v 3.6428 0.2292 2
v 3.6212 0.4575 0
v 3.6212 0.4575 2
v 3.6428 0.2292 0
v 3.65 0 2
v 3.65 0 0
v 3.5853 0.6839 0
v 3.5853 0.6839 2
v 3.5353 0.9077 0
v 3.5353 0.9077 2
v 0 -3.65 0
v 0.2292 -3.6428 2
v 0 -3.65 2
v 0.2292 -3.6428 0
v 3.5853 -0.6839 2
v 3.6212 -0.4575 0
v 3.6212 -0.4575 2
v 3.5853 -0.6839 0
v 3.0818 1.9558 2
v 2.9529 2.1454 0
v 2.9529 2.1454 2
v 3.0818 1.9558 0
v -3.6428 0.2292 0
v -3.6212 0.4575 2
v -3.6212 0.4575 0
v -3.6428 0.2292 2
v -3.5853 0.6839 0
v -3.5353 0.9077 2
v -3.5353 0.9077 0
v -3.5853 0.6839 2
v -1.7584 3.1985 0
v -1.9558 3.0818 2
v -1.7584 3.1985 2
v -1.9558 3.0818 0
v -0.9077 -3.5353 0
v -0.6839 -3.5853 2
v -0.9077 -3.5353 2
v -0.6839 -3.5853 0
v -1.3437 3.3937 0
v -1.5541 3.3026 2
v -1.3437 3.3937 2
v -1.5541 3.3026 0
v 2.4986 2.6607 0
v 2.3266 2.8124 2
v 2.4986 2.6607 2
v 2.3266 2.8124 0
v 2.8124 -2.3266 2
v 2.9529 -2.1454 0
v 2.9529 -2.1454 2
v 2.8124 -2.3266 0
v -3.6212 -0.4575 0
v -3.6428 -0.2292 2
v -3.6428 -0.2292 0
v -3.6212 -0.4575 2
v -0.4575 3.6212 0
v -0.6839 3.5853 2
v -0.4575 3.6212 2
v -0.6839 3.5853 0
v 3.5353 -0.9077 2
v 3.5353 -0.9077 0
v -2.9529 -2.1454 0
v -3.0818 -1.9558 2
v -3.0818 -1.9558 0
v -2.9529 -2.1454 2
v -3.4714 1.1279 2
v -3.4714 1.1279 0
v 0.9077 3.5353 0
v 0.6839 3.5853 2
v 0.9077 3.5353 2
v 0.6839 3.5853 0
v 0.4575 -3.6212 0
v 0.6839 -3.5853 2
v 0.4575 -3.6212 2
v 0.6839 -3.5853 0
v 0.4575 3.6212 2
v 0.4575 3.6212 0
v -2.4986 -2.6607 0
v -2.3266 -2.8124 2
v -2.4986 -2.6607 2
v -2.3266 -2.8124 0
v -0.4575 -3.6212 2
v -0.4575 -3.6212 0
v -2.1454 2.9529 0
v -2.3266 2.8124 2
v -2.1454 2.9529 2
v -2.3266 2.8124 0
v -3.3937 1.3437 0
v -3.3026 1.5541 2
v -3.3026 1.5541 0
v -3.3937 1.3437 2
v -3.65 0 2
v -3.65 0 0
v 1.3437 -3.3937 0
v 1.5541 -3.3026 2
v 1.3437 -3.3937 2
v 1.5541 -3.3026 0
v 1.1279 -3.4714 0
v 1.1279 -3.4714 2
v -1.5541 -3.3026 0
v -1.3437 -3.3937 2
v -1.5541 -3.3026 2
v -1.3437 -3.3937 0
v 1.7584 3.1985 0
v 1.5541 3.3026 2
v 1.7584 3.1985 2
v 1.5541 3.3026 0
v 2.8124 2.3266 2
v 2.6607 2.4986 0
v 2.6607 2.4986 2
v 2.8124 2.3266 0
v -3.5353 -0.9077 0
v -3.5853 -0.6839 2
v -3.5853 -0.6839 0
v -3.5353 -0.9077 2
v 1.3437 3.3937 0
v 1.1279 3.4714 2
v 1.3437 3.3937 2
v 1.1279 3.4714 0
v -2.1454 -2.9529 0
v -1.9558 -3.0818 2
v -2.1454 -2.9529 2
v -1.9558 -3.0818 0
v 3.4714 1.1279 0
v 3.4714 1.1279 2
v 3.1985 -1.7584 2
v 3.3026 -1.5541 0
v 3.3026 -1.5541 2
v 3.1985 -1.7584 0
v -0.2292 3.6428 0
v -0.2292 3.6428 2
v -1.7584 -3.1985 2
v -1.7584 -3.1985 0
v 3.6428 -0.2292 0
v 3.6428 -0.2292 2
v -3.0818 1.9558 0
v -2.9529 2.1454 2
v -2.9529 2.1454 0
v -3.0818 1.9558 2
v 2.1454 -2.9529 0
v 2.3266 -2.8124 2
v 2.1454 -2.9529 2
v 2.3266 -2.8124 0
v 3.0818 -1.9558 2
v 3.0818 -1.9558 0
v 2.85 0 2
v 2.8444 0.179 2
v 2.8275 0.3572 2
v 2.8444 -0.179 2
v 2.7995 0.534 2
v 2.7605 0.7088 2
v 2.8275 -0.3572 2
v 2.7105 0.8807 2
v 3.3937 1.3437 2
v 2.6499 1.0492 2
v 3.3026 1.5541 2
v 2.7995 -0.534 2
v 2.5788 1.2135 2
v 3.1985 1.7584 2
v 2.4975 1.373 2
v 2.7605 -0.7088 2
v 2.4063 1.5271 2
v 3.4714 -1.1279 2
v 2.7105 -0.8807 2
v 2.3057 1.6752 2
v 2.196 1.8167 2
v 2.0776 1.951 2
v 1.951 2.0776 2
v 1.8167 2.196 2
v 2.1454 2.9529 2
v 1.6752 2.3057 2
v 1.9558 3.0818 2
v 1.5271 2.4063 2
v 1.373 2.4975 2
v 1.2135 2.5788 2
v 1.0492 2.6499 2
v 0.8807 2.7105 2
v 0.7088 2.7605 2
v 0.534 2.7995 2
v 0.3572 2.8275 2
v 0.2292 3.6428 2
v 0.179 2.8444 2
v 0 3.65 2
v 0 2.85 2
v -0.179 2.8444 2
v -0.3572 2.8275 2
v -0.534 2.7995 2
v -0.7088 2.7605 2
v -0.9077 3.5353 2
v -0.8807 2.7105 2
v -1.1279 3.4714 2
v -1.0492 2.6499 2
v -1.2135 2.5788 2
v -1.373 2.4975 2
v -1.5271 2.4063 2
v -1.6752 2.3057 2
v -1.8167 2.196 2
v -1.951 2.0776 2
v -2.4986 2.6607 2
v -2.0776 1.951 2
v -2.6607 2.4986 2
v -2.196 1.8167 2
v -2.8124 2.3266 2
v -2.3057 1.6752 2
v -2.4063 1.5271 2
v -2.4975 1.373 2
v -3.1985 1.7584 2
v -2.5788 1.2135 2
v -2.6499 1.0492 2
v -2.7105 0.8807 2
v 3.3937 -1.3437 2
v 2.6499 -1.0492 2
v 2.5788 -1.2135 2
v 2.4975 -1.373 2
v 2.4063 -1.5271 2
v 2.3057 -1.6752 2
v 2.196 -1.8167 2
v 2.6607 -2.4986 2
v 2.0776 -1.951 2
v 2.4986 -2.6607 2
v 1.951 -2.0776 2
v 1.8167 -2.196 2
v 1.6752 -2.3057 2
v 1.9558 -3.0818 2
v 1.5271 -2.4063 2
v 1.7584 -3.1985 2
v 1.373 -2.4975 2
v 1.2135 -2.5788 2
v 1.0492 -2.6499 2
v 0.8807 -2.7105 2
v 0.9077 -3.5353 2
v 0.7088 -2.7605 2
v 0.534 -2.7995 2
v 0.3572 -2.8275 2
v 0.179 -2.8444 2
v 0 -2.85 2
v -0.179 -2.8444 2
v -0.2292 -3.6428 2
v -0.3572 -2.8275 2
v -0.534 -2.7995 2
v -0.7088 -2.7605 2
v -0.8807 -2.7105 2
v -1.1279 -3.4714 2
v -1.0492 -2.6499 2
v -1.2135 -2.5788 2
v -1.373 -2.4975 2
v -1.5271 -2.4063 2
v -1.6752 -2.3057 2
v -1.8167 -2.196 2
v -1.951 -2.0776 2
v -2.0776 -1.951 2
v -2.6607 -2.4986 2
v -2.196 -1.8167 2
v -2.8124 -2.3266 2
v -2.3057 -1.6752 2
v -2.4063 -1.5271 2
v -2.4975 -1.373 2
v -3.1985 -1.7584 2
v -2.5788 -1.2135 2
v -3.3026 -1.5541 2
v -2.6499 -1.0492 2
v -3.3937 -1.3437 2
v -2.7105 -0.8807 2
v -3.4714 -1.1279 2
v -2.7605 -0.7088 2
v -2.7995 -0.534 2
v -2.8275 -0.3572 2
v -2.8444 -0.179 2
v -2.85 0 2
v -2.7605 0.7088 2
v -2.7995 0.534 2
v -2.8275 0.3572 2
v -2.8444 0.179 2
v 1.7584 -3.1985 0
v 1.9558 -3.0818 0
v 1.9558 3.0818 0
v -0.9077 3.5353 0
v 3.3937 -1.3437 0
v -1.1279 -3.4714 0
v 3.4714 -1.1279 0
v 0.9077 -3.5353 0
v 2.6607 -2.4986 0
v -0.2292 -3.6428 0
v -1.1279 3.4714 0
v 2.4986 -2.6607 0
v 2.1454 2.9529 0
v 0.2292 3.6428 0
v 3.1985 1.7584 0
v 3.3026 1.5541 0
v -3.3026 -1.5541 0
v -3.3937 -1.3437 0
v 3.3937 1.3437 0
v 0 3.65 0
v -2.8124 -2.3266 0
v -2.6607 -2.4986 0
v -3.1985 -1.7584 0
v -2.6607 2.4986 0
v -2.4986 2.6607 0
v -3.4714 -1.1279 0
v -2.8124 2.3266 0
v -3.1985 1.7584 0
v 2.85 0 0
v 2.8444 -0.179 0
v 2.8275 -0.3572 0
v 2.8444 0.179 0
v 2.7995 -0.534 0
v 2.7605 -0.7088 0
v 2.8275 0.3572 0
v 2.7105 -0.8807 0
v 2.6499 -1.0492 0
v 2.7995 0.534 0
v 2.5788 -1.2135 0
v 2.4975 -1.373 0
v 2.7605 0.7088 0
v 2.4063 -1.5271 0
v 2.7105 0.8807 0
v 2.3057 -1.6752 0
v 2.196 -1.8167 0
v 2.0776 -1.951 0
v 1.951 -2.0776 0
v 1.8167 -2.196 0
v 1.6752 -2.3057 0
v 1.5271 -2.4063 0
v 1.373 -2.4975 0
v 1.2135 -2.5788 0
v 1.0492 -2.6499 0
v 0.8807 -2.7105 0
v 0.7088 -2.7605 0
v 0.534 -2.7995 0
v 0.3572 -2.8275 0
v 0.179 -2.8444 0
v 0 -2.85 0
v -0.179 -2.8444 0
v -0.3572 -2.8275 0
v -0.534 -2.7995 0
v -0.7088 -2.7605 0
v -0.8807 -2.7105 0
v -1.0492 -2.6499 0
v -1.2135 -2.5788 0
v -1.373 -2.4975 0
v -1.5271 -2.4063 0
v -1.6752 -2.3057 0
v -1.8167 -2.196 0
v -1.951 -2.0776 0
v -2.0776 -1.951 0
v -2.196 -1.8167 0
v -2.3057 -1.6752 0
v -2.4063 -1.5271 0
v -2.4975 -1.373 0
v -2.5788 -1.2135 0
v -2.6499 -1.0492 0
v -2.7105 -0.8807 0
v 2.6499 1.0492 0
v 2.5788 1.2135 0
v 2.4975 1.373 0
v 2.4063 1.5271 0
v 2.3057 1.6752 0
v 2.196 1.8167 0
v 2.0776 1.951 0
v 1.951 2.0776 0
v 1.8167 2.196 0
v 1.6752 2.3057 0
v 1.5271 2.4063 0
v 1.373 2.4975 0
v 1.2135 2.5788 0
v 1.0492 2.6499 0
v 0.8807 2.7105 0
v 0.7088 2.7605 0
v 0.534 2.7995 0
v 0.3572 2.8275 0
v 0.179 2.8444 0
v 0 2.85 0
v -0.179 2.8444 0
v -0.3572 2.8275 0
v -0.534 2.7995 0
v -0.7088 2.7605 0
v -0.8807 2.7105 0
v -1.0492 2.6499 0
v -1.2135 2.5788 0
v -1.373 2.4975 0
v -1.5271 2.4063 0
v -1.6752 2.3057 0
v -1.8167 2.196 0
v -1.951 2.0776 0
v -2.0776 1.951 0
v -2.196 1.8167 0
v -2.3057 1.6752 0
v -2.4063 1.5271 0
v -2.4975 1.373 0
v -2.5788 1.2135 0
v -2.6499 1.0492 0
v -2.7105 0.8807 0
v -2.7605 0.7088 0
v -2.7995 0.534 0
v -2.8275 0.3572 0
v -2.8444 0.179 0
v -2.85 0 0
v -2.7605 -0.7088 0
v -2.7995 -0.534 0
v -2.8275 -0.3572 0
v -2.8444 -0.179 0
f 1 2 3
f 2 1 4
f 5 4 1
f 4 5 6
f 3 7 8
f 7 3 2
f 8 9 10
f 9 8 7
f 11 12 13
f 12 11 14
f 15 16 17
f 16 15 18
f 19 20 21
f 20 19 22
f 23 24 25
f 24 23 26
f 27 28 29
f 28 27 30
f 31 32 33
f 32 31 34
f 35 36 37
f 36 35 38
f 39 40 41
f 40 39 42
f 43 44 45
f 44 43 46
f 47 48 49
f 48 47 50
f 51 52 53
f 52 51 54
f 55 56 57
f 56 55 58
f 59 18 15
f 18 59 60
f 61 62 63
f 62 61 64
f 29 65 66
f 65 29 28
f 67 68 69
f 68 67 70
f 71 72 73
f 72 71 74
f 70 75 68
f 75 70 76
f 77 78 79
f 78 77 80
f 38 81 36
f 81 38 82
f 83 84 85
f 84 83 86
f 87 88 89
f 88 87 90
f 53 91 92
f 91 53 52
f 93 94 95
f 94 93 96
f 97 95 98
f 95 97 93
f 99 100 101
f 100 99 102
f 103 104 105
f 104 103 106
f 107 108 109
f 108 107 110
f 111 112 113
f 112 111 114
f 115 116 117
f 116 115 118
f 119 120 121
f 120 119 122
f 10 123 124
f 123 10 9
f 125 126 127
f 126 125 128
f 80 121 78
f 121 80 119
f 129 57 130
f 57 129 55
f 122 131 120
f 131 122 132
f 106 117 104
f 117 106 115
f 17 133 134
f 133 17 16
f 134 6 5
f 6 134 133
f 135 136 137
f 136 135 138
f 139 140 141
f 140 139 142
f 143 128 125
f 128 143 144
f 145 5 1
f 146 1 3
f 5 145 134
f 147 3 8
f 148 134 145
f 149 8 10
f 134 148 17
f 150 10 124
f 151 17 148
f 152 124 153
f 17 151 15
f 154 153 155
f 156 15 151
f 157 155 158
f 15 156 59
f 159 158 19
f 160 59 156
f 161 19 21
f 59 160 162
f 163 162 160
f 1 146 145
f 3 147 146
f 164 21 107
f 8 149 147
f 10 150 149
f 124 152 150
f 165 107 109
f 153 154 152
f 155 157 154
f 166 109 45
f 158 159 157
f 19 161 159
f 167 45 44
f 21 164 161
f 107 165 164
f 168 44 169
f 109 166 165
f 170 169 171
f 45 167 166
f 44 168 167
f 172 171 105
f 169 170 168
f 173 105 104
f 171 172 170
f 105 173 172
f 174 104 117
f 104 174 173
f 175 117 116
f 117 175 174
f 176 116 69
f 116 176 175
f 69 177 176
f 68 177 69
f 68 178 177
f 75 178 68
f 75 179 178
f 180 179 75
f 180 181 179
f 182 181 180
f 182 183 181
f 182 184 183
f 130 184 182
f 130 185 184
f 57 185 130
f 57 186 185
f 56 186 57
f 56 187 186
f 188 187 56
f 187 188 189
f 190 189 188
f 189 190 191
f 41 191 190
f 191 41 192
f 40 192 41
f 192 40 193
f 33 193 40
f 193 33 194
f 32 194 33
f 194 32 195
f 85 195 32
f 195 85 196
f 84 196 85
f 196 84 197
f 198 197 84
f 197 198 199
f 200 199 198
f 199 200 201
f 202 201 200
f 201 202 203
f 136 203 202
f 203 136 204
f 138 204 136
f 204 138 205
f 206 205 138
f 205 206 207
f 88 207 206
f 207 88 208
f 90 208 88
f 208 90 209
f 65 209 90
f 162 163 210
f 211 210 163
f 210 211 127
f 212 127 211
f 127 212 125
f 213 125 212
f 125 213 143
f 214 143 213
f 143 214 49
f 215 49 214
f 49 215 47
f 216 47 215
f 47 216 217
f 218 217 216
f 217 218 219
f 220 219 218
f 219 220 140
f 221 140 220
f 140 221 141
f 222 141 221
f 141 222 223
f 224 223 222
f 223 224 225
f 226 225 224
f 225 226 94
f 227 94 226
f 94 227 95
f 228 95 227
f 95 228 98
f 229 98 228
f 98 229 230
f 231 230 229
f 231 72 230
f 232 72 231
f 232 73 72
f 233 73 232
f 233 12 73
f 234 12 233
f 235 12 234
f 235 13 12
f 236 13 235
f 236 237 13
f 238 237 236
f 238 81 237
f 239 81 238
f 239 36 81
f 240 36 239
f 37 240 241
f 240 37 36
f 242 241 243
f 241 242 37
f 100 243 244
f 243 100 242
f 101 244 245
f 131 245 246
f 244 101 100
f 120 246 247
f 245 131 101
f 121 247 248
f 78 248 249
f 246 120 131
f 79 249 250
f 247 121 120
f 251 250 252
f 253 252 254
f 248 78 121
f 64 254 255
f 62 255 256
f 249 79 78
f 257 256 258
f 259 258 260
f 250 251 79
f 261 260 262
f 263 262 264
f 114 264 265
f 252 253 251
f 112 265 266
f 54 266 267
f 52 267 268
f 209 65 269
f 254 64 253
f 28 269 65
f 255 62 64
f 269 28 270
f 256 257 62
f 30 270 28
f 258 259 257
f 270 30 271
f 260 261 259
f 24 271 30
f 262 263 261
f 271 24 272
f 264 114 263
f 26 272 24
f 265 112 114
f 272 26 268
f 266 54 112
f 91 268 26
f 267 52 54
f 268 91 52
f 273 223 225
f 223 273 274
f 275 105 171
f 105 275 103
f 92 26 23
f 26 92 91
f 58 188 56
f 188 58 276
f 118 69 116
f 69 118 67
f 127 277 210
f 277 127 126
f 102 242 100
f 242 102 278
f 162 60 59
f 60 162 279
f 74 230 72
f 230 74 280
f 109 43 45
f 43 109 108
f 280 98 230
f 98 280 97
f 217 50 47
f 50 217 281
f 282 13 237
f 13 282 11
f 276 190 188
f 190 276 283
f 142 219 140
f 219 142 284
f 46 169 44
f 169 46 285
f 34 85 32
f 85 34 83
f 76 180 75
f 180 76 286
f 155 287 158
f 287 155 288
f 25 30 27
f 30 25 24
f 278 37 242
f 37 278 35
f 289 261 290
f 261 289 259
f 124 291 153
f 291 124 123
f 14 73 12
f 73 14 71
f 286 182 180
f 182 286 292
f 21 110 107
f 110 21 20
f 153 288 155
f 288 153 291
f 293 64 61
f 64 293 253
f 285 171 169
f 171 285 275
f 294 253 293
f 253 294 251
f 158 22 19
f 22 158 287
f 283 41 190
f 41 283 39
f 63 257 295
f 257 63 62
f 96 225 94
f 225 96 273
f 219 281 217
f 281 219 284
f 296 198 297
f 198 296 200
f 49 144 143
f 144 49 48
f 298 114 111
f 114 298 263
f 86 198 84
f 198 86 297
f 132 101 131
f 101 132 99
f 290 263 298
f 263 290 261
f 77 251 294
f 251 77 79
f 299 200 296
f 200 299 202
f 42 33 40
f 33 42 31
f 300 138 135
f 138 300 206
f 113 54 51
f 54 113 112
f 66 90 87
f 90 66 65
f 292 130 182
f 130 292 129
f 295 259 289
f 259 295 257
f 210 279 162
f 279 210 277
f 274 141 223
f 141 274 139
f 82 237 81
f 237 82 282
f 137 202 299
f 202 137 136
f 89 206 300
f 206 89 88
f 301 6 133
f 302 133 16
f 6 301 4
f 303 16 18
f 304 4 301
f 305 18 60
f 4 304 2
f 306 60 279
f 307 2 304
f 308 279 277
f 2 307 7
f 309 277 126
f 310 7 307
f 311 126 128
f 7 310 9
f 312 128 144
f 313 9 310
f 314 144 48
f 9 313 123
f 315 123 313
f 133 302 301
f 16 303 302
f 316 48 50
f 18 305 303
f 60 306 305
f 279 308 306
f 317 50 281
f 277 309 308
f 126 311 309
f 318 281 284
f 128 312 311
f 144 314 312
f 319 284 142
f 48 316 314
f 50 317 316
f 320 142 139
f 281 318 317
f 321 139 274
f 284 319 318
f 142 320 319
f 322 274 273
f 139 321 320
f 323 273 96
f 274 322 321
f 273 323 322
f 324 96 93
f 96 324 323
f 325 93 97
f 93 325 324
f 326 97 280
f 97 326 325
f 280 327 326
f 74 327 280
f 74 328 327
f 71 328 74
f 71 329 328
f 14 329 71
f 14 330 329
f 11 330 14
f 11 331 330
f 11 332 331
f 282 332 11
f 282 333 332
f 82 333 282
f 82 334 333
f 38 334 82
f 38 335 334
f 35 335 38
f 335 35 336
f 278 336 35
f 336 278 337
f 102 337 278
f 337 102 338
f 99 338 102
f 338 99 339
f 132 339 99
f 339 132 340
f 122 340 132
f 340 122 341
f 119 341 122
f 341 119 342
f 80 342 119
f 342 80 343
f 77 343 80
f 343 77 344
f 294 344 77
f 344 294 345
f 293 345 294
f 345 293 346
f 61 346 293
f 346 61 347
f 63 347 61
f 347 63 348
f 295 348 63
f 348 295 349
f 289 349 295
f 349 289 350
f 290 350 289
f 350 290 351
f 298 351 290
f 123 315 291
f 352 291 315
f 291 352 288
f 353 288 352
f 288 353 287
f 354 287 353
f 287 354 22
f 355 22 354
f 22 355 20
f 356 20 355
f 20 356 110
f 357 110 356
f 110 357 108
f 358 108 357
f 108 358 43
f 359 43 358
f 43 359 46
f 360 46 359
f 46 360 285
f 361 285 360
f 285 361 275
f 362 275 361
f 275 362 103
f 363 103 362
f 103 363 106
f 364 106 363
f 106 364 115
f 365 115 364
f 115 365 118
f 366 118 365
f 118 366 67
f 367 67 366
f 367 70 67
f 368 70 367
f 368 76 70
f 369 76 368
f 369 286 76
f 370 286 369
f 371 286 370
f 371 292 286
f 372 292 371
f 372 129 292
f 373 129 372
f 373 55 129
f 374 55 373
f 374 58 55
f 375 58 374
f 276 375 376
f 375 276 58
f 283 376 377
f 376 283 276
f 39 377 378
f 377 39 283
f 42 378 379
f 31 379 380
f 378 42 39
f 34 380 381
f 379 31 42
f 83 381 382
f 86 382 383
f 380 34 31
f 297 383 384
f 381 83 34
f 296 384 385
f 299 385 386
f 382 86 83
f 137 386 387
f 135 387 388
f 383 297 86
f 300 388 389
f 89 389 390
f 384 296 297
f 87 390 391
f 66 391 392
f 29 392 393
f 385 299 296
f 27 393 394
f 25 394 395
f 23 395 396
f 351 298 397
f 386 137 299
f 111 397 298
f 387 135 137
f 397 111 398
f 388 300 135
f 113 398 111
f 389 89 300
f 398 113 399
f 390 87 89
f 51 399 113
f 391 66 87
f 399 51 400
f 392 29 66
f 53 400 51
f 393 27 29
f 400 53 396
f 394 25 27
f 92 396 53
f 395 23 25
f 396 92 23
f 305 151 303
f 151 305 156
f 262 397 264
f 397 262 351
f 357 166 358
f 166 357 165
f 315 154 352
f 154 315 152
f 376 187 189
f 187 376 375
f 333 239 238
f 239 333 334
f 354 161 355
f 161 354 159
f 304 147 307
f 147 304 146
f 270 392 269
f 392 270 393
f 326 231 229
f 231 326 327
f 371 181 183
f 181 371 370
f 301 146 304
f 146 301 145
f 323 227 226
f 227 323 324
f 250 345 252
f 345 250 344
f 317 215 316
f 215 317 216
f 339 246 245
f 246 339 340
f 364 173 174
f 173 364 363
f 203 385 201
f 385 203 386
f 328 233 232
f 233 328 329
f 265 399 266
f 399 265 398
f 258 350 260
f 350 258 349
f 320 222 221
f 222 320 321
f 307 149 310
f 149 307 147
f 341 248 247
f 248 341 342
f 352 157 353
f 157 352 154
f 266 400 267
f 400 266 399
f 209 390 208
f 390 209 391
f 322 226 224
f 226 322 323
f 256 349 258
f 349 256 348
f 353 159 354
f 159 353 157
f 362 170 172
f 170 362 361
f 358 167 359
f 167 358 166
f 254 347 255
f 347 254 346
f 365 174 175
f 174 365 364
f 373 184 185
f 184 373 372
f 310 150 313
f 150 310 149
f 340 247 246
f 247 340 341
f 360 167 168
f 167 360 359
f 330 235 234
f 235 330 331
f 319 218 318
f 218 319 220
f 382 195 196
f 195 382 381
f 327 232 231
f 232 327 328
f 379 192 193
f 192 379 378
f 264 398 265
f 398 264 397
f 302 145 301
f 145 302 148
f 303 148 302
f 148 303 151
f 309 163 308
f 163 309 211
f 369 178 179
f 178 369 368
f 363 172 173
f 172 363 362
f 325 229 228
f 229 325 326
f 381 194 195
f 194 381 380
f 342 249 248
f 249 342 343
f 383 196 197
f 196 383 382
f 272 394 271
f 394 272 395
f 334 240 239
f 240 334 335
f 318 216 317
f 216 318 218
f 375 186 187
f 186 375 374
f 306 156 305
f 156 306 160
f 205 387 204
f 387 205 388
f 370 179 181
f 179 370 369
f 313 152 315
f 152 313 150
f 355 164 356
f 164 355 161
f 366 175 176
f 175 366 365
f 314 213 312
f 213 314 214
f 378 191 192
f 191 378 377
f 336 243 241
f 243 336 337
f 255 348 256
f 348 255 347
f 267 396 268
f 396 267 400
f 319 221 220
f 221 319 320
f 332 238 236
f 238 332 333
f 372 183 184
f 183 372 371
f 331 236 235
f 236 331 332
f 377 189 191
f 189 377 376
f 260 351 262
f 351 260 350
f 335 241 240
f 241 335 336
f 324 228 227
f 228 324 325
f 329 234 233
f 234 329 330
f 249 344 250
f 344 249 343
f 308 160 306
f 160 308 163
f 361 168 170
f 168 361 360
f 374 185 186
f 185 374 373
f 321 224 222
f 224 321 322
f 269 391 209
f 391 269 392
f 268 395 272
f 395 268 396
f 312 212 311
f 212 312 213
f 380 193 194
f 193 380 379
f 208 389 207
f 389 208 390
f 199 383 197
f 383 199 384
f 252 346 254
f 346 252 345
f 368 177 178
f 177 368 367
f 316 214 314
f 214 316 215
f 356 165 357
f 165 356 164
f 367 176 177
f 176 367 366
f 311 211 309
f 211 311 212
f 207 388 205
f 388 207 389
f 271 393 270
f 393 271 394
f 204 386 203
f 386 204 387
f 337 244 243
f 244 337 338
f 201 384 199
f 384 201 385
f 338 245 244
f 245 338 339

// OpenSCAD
$fn=100;
difference()
{
	cylinder (d=7+0.3,h=2);
	translate ([0,0,-1])
		cylinder (d=5.4+0.3,h=10);
}
